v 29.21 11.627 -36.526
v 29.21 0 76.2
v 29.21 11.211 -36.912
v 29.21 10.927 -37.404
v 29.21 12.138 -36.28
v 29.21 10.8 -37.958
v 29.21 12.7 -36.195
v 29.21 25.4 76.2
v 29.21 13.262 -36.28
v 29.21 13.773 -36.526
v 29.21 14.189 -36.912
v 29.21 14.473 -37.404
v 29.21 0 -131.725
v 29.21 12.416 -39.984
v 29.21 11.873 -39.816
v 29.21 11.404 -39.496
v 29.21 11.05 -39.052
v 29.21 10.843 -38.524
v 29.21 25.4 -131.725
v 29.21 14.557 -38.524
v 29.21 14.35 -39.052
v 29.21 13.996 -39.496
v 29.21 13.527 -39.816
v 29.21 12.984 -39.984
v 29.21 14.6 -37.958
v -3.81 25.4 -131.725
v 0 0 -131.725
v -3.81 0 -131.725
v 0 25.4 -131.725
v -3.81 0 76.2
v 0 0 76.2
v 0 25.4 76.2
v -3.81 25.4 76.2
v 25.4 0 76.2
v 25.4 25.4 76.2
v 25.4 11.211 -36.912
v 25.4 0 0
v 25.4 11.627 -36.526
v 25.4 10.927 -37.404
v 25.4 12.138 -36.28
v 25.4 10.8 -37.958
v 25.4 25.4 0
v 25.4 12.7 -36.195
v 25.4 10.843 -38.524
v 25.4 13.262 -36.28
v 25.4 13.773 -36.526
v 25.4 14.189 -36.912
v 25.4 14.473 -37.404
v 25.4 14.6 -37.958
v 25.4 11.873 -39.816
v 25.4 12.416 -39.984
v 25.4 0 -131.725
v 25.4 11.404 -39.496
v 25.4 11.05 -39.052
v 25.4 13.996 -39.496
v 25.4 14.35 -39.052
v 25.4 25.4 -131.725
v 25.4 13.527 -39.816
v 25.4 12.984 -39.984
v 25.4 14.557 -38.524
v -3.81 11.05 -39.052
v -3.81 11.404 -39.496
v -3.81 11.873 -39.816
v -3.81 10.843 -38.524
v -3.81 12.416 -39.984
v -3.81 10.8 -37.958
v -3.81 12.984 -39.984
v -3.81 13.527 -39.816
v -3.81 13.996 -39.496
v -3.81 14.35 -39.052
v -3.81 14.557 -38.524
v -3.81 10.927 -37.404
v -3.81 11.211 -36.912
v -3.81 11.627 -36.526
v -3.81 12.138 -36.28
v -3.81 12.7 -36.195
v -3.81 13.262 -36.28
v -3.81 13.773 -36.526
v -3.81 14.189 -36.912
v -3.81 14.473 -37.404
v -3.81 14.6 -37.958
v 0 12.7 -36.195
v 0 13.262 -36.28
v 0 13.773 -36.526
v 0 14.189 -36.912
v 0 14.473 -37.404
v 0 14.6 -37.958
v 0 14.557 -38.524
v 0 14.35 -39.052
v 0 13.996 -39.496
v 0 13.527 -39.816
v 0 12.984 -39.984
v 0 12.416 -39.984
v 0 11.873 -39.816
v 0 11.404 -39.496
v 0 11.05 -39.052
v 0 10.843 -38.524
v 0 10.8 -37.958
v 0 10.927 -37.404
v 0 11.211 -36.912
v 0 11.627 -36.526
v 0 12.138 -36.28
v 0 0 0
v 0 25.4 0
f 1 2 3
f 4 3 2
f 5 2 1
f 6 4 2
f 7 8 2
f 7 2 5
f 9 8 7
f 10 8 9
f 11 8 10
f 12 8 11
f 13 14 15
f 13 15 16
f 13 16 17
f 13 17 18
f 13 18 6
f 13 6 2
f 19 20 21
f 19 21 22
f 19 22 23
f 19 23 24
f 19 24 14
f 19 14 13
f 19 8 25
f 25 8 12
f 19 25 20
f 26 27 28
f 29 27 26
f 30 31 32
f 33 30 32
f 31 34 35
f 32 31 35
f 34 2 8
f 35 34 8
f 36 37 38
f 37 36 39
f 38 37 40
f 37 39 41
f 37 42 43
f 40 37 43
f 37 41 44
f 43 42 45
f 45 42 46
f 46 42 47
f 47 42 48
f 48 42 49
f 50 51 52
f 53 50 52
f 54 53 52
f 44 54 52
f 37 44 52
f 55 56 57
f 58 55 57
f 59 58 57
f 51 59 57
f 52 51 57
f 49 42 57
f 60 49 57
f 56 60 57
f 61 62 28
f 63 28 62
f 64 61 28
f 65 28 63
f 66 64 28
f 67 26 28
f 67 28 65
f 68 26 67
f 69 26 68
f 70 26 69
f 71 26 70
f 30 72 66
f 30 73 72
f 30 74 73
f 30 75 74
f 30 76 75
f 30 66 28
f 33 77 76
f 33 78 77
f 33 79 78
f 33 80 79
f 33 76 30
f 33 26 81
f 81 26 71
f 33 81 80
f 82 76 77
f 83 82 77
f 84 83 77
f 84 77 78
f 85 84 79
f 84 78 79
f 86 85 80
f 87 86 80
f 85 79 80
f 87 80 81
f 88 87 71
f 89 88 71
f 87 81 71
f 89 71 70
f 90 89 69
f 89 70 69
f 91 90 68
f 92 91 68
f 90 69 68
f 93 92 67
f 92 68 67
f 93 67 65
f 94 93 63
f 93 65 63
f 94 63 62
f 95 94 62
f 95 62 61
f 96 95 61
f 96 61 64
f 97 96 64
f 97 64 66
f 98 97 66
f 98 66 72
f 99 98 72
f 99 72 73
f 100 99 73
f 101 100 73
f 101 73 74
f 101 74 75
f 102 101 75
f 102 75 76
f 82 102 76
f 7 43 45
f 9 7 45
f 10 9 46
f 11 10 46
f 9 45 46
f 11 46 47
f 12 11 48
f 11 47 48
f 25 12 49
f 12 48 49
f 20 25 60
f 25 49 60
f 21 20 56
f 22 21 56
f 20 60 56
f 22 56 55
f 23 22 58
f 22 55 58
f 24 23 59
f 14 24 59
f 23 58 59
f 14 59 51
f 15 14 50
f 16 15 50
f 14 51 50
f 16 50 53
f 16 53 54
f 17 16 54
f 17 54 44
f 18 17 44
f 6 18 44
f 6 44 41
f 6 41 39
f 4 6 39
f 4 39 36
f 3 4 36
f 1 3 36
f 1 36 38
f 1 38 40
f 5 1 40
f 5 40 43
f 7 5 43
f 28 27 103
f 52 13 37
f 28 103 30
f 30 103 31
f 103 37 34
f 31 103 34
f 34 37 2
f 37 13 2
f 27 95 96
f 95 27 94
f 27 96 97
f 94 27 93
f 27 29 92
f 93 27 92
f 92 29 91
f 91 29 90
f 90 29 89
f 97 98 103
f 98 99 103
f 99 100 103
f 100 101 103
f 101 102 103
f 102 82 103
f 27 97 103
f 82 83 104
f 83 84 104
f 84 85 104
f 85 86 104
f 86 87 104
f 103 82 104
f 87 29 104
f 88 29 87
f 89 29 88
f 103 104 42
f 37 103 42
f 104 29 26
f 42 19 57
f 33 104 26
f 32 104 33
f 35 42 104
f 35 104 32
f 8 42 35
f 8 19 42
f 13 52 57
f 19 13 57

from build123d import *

# Parameters (mm, degrees)
SKETCH2_W           = 25.4
SKETCH2_H           = 25.4
BOSS_EXTRUDE1_DEPTH = 76.2
SKETCH3_W           = 207.924844479
SKETCH3_H           = 25.4
BOSS_EXTRUDE2_DEPTH = 3.81
SKETCH4_W           = 207.924844479
SKETCH4_H           = 25.4
BOSS_EXTRUDE3_DEPTH = 3.81
SKETCH5_R           = 1.905
CUT_EXTRUDE1_DEPTH  = 139.155401824


with BuildPart() as part:
    # Sketch2 → Boss-Extrude1 (new body)
    with BuildSketch(Plane.XY):
        with Locations((12.7, 12.7)):
            Rectangle(SKETCH2_W, SKETCH2_H)
    extrude(amount=BOSS_EXTRUDE1_DEPTH)

    # Sketch3 → Boss-Extrude2 (add)
    with BuildSketch(Plane(origin=(25.4, 0, 0), x_dir=(0, 0, -1), z_dir=(1, 0, 0))):
        with Locations((27.76242224, 12.7)):
            Rectangle(SKETCH3_W, SKETCH3_H)
    extrude(amount=BOSS_EXTRUDE2_DEPTH)

    # Sketch4 → Boss-Extrude3 (add)
    with BuildSketch(Plane.ZY):
        with Locations((-27.76242224, 12.7)):
            Rectangle(SKETCH4_W, SKETCH4_H)
    extrude(amount=BOSS_EXTRUDE3_DEPTH)

    # Sketch5 → Cut-Extrude1 (cut, through all)
    with BuildSketch(Plane.ZY.offset(3.81)):
        with Locations((-38.1, 12.7)):
            Circle(SKETCH5_R)
    extrude(amount=-CUT_EXTRUDE1_DEPTH, mode=Mode.SUBTRACT)


solid = part.part
